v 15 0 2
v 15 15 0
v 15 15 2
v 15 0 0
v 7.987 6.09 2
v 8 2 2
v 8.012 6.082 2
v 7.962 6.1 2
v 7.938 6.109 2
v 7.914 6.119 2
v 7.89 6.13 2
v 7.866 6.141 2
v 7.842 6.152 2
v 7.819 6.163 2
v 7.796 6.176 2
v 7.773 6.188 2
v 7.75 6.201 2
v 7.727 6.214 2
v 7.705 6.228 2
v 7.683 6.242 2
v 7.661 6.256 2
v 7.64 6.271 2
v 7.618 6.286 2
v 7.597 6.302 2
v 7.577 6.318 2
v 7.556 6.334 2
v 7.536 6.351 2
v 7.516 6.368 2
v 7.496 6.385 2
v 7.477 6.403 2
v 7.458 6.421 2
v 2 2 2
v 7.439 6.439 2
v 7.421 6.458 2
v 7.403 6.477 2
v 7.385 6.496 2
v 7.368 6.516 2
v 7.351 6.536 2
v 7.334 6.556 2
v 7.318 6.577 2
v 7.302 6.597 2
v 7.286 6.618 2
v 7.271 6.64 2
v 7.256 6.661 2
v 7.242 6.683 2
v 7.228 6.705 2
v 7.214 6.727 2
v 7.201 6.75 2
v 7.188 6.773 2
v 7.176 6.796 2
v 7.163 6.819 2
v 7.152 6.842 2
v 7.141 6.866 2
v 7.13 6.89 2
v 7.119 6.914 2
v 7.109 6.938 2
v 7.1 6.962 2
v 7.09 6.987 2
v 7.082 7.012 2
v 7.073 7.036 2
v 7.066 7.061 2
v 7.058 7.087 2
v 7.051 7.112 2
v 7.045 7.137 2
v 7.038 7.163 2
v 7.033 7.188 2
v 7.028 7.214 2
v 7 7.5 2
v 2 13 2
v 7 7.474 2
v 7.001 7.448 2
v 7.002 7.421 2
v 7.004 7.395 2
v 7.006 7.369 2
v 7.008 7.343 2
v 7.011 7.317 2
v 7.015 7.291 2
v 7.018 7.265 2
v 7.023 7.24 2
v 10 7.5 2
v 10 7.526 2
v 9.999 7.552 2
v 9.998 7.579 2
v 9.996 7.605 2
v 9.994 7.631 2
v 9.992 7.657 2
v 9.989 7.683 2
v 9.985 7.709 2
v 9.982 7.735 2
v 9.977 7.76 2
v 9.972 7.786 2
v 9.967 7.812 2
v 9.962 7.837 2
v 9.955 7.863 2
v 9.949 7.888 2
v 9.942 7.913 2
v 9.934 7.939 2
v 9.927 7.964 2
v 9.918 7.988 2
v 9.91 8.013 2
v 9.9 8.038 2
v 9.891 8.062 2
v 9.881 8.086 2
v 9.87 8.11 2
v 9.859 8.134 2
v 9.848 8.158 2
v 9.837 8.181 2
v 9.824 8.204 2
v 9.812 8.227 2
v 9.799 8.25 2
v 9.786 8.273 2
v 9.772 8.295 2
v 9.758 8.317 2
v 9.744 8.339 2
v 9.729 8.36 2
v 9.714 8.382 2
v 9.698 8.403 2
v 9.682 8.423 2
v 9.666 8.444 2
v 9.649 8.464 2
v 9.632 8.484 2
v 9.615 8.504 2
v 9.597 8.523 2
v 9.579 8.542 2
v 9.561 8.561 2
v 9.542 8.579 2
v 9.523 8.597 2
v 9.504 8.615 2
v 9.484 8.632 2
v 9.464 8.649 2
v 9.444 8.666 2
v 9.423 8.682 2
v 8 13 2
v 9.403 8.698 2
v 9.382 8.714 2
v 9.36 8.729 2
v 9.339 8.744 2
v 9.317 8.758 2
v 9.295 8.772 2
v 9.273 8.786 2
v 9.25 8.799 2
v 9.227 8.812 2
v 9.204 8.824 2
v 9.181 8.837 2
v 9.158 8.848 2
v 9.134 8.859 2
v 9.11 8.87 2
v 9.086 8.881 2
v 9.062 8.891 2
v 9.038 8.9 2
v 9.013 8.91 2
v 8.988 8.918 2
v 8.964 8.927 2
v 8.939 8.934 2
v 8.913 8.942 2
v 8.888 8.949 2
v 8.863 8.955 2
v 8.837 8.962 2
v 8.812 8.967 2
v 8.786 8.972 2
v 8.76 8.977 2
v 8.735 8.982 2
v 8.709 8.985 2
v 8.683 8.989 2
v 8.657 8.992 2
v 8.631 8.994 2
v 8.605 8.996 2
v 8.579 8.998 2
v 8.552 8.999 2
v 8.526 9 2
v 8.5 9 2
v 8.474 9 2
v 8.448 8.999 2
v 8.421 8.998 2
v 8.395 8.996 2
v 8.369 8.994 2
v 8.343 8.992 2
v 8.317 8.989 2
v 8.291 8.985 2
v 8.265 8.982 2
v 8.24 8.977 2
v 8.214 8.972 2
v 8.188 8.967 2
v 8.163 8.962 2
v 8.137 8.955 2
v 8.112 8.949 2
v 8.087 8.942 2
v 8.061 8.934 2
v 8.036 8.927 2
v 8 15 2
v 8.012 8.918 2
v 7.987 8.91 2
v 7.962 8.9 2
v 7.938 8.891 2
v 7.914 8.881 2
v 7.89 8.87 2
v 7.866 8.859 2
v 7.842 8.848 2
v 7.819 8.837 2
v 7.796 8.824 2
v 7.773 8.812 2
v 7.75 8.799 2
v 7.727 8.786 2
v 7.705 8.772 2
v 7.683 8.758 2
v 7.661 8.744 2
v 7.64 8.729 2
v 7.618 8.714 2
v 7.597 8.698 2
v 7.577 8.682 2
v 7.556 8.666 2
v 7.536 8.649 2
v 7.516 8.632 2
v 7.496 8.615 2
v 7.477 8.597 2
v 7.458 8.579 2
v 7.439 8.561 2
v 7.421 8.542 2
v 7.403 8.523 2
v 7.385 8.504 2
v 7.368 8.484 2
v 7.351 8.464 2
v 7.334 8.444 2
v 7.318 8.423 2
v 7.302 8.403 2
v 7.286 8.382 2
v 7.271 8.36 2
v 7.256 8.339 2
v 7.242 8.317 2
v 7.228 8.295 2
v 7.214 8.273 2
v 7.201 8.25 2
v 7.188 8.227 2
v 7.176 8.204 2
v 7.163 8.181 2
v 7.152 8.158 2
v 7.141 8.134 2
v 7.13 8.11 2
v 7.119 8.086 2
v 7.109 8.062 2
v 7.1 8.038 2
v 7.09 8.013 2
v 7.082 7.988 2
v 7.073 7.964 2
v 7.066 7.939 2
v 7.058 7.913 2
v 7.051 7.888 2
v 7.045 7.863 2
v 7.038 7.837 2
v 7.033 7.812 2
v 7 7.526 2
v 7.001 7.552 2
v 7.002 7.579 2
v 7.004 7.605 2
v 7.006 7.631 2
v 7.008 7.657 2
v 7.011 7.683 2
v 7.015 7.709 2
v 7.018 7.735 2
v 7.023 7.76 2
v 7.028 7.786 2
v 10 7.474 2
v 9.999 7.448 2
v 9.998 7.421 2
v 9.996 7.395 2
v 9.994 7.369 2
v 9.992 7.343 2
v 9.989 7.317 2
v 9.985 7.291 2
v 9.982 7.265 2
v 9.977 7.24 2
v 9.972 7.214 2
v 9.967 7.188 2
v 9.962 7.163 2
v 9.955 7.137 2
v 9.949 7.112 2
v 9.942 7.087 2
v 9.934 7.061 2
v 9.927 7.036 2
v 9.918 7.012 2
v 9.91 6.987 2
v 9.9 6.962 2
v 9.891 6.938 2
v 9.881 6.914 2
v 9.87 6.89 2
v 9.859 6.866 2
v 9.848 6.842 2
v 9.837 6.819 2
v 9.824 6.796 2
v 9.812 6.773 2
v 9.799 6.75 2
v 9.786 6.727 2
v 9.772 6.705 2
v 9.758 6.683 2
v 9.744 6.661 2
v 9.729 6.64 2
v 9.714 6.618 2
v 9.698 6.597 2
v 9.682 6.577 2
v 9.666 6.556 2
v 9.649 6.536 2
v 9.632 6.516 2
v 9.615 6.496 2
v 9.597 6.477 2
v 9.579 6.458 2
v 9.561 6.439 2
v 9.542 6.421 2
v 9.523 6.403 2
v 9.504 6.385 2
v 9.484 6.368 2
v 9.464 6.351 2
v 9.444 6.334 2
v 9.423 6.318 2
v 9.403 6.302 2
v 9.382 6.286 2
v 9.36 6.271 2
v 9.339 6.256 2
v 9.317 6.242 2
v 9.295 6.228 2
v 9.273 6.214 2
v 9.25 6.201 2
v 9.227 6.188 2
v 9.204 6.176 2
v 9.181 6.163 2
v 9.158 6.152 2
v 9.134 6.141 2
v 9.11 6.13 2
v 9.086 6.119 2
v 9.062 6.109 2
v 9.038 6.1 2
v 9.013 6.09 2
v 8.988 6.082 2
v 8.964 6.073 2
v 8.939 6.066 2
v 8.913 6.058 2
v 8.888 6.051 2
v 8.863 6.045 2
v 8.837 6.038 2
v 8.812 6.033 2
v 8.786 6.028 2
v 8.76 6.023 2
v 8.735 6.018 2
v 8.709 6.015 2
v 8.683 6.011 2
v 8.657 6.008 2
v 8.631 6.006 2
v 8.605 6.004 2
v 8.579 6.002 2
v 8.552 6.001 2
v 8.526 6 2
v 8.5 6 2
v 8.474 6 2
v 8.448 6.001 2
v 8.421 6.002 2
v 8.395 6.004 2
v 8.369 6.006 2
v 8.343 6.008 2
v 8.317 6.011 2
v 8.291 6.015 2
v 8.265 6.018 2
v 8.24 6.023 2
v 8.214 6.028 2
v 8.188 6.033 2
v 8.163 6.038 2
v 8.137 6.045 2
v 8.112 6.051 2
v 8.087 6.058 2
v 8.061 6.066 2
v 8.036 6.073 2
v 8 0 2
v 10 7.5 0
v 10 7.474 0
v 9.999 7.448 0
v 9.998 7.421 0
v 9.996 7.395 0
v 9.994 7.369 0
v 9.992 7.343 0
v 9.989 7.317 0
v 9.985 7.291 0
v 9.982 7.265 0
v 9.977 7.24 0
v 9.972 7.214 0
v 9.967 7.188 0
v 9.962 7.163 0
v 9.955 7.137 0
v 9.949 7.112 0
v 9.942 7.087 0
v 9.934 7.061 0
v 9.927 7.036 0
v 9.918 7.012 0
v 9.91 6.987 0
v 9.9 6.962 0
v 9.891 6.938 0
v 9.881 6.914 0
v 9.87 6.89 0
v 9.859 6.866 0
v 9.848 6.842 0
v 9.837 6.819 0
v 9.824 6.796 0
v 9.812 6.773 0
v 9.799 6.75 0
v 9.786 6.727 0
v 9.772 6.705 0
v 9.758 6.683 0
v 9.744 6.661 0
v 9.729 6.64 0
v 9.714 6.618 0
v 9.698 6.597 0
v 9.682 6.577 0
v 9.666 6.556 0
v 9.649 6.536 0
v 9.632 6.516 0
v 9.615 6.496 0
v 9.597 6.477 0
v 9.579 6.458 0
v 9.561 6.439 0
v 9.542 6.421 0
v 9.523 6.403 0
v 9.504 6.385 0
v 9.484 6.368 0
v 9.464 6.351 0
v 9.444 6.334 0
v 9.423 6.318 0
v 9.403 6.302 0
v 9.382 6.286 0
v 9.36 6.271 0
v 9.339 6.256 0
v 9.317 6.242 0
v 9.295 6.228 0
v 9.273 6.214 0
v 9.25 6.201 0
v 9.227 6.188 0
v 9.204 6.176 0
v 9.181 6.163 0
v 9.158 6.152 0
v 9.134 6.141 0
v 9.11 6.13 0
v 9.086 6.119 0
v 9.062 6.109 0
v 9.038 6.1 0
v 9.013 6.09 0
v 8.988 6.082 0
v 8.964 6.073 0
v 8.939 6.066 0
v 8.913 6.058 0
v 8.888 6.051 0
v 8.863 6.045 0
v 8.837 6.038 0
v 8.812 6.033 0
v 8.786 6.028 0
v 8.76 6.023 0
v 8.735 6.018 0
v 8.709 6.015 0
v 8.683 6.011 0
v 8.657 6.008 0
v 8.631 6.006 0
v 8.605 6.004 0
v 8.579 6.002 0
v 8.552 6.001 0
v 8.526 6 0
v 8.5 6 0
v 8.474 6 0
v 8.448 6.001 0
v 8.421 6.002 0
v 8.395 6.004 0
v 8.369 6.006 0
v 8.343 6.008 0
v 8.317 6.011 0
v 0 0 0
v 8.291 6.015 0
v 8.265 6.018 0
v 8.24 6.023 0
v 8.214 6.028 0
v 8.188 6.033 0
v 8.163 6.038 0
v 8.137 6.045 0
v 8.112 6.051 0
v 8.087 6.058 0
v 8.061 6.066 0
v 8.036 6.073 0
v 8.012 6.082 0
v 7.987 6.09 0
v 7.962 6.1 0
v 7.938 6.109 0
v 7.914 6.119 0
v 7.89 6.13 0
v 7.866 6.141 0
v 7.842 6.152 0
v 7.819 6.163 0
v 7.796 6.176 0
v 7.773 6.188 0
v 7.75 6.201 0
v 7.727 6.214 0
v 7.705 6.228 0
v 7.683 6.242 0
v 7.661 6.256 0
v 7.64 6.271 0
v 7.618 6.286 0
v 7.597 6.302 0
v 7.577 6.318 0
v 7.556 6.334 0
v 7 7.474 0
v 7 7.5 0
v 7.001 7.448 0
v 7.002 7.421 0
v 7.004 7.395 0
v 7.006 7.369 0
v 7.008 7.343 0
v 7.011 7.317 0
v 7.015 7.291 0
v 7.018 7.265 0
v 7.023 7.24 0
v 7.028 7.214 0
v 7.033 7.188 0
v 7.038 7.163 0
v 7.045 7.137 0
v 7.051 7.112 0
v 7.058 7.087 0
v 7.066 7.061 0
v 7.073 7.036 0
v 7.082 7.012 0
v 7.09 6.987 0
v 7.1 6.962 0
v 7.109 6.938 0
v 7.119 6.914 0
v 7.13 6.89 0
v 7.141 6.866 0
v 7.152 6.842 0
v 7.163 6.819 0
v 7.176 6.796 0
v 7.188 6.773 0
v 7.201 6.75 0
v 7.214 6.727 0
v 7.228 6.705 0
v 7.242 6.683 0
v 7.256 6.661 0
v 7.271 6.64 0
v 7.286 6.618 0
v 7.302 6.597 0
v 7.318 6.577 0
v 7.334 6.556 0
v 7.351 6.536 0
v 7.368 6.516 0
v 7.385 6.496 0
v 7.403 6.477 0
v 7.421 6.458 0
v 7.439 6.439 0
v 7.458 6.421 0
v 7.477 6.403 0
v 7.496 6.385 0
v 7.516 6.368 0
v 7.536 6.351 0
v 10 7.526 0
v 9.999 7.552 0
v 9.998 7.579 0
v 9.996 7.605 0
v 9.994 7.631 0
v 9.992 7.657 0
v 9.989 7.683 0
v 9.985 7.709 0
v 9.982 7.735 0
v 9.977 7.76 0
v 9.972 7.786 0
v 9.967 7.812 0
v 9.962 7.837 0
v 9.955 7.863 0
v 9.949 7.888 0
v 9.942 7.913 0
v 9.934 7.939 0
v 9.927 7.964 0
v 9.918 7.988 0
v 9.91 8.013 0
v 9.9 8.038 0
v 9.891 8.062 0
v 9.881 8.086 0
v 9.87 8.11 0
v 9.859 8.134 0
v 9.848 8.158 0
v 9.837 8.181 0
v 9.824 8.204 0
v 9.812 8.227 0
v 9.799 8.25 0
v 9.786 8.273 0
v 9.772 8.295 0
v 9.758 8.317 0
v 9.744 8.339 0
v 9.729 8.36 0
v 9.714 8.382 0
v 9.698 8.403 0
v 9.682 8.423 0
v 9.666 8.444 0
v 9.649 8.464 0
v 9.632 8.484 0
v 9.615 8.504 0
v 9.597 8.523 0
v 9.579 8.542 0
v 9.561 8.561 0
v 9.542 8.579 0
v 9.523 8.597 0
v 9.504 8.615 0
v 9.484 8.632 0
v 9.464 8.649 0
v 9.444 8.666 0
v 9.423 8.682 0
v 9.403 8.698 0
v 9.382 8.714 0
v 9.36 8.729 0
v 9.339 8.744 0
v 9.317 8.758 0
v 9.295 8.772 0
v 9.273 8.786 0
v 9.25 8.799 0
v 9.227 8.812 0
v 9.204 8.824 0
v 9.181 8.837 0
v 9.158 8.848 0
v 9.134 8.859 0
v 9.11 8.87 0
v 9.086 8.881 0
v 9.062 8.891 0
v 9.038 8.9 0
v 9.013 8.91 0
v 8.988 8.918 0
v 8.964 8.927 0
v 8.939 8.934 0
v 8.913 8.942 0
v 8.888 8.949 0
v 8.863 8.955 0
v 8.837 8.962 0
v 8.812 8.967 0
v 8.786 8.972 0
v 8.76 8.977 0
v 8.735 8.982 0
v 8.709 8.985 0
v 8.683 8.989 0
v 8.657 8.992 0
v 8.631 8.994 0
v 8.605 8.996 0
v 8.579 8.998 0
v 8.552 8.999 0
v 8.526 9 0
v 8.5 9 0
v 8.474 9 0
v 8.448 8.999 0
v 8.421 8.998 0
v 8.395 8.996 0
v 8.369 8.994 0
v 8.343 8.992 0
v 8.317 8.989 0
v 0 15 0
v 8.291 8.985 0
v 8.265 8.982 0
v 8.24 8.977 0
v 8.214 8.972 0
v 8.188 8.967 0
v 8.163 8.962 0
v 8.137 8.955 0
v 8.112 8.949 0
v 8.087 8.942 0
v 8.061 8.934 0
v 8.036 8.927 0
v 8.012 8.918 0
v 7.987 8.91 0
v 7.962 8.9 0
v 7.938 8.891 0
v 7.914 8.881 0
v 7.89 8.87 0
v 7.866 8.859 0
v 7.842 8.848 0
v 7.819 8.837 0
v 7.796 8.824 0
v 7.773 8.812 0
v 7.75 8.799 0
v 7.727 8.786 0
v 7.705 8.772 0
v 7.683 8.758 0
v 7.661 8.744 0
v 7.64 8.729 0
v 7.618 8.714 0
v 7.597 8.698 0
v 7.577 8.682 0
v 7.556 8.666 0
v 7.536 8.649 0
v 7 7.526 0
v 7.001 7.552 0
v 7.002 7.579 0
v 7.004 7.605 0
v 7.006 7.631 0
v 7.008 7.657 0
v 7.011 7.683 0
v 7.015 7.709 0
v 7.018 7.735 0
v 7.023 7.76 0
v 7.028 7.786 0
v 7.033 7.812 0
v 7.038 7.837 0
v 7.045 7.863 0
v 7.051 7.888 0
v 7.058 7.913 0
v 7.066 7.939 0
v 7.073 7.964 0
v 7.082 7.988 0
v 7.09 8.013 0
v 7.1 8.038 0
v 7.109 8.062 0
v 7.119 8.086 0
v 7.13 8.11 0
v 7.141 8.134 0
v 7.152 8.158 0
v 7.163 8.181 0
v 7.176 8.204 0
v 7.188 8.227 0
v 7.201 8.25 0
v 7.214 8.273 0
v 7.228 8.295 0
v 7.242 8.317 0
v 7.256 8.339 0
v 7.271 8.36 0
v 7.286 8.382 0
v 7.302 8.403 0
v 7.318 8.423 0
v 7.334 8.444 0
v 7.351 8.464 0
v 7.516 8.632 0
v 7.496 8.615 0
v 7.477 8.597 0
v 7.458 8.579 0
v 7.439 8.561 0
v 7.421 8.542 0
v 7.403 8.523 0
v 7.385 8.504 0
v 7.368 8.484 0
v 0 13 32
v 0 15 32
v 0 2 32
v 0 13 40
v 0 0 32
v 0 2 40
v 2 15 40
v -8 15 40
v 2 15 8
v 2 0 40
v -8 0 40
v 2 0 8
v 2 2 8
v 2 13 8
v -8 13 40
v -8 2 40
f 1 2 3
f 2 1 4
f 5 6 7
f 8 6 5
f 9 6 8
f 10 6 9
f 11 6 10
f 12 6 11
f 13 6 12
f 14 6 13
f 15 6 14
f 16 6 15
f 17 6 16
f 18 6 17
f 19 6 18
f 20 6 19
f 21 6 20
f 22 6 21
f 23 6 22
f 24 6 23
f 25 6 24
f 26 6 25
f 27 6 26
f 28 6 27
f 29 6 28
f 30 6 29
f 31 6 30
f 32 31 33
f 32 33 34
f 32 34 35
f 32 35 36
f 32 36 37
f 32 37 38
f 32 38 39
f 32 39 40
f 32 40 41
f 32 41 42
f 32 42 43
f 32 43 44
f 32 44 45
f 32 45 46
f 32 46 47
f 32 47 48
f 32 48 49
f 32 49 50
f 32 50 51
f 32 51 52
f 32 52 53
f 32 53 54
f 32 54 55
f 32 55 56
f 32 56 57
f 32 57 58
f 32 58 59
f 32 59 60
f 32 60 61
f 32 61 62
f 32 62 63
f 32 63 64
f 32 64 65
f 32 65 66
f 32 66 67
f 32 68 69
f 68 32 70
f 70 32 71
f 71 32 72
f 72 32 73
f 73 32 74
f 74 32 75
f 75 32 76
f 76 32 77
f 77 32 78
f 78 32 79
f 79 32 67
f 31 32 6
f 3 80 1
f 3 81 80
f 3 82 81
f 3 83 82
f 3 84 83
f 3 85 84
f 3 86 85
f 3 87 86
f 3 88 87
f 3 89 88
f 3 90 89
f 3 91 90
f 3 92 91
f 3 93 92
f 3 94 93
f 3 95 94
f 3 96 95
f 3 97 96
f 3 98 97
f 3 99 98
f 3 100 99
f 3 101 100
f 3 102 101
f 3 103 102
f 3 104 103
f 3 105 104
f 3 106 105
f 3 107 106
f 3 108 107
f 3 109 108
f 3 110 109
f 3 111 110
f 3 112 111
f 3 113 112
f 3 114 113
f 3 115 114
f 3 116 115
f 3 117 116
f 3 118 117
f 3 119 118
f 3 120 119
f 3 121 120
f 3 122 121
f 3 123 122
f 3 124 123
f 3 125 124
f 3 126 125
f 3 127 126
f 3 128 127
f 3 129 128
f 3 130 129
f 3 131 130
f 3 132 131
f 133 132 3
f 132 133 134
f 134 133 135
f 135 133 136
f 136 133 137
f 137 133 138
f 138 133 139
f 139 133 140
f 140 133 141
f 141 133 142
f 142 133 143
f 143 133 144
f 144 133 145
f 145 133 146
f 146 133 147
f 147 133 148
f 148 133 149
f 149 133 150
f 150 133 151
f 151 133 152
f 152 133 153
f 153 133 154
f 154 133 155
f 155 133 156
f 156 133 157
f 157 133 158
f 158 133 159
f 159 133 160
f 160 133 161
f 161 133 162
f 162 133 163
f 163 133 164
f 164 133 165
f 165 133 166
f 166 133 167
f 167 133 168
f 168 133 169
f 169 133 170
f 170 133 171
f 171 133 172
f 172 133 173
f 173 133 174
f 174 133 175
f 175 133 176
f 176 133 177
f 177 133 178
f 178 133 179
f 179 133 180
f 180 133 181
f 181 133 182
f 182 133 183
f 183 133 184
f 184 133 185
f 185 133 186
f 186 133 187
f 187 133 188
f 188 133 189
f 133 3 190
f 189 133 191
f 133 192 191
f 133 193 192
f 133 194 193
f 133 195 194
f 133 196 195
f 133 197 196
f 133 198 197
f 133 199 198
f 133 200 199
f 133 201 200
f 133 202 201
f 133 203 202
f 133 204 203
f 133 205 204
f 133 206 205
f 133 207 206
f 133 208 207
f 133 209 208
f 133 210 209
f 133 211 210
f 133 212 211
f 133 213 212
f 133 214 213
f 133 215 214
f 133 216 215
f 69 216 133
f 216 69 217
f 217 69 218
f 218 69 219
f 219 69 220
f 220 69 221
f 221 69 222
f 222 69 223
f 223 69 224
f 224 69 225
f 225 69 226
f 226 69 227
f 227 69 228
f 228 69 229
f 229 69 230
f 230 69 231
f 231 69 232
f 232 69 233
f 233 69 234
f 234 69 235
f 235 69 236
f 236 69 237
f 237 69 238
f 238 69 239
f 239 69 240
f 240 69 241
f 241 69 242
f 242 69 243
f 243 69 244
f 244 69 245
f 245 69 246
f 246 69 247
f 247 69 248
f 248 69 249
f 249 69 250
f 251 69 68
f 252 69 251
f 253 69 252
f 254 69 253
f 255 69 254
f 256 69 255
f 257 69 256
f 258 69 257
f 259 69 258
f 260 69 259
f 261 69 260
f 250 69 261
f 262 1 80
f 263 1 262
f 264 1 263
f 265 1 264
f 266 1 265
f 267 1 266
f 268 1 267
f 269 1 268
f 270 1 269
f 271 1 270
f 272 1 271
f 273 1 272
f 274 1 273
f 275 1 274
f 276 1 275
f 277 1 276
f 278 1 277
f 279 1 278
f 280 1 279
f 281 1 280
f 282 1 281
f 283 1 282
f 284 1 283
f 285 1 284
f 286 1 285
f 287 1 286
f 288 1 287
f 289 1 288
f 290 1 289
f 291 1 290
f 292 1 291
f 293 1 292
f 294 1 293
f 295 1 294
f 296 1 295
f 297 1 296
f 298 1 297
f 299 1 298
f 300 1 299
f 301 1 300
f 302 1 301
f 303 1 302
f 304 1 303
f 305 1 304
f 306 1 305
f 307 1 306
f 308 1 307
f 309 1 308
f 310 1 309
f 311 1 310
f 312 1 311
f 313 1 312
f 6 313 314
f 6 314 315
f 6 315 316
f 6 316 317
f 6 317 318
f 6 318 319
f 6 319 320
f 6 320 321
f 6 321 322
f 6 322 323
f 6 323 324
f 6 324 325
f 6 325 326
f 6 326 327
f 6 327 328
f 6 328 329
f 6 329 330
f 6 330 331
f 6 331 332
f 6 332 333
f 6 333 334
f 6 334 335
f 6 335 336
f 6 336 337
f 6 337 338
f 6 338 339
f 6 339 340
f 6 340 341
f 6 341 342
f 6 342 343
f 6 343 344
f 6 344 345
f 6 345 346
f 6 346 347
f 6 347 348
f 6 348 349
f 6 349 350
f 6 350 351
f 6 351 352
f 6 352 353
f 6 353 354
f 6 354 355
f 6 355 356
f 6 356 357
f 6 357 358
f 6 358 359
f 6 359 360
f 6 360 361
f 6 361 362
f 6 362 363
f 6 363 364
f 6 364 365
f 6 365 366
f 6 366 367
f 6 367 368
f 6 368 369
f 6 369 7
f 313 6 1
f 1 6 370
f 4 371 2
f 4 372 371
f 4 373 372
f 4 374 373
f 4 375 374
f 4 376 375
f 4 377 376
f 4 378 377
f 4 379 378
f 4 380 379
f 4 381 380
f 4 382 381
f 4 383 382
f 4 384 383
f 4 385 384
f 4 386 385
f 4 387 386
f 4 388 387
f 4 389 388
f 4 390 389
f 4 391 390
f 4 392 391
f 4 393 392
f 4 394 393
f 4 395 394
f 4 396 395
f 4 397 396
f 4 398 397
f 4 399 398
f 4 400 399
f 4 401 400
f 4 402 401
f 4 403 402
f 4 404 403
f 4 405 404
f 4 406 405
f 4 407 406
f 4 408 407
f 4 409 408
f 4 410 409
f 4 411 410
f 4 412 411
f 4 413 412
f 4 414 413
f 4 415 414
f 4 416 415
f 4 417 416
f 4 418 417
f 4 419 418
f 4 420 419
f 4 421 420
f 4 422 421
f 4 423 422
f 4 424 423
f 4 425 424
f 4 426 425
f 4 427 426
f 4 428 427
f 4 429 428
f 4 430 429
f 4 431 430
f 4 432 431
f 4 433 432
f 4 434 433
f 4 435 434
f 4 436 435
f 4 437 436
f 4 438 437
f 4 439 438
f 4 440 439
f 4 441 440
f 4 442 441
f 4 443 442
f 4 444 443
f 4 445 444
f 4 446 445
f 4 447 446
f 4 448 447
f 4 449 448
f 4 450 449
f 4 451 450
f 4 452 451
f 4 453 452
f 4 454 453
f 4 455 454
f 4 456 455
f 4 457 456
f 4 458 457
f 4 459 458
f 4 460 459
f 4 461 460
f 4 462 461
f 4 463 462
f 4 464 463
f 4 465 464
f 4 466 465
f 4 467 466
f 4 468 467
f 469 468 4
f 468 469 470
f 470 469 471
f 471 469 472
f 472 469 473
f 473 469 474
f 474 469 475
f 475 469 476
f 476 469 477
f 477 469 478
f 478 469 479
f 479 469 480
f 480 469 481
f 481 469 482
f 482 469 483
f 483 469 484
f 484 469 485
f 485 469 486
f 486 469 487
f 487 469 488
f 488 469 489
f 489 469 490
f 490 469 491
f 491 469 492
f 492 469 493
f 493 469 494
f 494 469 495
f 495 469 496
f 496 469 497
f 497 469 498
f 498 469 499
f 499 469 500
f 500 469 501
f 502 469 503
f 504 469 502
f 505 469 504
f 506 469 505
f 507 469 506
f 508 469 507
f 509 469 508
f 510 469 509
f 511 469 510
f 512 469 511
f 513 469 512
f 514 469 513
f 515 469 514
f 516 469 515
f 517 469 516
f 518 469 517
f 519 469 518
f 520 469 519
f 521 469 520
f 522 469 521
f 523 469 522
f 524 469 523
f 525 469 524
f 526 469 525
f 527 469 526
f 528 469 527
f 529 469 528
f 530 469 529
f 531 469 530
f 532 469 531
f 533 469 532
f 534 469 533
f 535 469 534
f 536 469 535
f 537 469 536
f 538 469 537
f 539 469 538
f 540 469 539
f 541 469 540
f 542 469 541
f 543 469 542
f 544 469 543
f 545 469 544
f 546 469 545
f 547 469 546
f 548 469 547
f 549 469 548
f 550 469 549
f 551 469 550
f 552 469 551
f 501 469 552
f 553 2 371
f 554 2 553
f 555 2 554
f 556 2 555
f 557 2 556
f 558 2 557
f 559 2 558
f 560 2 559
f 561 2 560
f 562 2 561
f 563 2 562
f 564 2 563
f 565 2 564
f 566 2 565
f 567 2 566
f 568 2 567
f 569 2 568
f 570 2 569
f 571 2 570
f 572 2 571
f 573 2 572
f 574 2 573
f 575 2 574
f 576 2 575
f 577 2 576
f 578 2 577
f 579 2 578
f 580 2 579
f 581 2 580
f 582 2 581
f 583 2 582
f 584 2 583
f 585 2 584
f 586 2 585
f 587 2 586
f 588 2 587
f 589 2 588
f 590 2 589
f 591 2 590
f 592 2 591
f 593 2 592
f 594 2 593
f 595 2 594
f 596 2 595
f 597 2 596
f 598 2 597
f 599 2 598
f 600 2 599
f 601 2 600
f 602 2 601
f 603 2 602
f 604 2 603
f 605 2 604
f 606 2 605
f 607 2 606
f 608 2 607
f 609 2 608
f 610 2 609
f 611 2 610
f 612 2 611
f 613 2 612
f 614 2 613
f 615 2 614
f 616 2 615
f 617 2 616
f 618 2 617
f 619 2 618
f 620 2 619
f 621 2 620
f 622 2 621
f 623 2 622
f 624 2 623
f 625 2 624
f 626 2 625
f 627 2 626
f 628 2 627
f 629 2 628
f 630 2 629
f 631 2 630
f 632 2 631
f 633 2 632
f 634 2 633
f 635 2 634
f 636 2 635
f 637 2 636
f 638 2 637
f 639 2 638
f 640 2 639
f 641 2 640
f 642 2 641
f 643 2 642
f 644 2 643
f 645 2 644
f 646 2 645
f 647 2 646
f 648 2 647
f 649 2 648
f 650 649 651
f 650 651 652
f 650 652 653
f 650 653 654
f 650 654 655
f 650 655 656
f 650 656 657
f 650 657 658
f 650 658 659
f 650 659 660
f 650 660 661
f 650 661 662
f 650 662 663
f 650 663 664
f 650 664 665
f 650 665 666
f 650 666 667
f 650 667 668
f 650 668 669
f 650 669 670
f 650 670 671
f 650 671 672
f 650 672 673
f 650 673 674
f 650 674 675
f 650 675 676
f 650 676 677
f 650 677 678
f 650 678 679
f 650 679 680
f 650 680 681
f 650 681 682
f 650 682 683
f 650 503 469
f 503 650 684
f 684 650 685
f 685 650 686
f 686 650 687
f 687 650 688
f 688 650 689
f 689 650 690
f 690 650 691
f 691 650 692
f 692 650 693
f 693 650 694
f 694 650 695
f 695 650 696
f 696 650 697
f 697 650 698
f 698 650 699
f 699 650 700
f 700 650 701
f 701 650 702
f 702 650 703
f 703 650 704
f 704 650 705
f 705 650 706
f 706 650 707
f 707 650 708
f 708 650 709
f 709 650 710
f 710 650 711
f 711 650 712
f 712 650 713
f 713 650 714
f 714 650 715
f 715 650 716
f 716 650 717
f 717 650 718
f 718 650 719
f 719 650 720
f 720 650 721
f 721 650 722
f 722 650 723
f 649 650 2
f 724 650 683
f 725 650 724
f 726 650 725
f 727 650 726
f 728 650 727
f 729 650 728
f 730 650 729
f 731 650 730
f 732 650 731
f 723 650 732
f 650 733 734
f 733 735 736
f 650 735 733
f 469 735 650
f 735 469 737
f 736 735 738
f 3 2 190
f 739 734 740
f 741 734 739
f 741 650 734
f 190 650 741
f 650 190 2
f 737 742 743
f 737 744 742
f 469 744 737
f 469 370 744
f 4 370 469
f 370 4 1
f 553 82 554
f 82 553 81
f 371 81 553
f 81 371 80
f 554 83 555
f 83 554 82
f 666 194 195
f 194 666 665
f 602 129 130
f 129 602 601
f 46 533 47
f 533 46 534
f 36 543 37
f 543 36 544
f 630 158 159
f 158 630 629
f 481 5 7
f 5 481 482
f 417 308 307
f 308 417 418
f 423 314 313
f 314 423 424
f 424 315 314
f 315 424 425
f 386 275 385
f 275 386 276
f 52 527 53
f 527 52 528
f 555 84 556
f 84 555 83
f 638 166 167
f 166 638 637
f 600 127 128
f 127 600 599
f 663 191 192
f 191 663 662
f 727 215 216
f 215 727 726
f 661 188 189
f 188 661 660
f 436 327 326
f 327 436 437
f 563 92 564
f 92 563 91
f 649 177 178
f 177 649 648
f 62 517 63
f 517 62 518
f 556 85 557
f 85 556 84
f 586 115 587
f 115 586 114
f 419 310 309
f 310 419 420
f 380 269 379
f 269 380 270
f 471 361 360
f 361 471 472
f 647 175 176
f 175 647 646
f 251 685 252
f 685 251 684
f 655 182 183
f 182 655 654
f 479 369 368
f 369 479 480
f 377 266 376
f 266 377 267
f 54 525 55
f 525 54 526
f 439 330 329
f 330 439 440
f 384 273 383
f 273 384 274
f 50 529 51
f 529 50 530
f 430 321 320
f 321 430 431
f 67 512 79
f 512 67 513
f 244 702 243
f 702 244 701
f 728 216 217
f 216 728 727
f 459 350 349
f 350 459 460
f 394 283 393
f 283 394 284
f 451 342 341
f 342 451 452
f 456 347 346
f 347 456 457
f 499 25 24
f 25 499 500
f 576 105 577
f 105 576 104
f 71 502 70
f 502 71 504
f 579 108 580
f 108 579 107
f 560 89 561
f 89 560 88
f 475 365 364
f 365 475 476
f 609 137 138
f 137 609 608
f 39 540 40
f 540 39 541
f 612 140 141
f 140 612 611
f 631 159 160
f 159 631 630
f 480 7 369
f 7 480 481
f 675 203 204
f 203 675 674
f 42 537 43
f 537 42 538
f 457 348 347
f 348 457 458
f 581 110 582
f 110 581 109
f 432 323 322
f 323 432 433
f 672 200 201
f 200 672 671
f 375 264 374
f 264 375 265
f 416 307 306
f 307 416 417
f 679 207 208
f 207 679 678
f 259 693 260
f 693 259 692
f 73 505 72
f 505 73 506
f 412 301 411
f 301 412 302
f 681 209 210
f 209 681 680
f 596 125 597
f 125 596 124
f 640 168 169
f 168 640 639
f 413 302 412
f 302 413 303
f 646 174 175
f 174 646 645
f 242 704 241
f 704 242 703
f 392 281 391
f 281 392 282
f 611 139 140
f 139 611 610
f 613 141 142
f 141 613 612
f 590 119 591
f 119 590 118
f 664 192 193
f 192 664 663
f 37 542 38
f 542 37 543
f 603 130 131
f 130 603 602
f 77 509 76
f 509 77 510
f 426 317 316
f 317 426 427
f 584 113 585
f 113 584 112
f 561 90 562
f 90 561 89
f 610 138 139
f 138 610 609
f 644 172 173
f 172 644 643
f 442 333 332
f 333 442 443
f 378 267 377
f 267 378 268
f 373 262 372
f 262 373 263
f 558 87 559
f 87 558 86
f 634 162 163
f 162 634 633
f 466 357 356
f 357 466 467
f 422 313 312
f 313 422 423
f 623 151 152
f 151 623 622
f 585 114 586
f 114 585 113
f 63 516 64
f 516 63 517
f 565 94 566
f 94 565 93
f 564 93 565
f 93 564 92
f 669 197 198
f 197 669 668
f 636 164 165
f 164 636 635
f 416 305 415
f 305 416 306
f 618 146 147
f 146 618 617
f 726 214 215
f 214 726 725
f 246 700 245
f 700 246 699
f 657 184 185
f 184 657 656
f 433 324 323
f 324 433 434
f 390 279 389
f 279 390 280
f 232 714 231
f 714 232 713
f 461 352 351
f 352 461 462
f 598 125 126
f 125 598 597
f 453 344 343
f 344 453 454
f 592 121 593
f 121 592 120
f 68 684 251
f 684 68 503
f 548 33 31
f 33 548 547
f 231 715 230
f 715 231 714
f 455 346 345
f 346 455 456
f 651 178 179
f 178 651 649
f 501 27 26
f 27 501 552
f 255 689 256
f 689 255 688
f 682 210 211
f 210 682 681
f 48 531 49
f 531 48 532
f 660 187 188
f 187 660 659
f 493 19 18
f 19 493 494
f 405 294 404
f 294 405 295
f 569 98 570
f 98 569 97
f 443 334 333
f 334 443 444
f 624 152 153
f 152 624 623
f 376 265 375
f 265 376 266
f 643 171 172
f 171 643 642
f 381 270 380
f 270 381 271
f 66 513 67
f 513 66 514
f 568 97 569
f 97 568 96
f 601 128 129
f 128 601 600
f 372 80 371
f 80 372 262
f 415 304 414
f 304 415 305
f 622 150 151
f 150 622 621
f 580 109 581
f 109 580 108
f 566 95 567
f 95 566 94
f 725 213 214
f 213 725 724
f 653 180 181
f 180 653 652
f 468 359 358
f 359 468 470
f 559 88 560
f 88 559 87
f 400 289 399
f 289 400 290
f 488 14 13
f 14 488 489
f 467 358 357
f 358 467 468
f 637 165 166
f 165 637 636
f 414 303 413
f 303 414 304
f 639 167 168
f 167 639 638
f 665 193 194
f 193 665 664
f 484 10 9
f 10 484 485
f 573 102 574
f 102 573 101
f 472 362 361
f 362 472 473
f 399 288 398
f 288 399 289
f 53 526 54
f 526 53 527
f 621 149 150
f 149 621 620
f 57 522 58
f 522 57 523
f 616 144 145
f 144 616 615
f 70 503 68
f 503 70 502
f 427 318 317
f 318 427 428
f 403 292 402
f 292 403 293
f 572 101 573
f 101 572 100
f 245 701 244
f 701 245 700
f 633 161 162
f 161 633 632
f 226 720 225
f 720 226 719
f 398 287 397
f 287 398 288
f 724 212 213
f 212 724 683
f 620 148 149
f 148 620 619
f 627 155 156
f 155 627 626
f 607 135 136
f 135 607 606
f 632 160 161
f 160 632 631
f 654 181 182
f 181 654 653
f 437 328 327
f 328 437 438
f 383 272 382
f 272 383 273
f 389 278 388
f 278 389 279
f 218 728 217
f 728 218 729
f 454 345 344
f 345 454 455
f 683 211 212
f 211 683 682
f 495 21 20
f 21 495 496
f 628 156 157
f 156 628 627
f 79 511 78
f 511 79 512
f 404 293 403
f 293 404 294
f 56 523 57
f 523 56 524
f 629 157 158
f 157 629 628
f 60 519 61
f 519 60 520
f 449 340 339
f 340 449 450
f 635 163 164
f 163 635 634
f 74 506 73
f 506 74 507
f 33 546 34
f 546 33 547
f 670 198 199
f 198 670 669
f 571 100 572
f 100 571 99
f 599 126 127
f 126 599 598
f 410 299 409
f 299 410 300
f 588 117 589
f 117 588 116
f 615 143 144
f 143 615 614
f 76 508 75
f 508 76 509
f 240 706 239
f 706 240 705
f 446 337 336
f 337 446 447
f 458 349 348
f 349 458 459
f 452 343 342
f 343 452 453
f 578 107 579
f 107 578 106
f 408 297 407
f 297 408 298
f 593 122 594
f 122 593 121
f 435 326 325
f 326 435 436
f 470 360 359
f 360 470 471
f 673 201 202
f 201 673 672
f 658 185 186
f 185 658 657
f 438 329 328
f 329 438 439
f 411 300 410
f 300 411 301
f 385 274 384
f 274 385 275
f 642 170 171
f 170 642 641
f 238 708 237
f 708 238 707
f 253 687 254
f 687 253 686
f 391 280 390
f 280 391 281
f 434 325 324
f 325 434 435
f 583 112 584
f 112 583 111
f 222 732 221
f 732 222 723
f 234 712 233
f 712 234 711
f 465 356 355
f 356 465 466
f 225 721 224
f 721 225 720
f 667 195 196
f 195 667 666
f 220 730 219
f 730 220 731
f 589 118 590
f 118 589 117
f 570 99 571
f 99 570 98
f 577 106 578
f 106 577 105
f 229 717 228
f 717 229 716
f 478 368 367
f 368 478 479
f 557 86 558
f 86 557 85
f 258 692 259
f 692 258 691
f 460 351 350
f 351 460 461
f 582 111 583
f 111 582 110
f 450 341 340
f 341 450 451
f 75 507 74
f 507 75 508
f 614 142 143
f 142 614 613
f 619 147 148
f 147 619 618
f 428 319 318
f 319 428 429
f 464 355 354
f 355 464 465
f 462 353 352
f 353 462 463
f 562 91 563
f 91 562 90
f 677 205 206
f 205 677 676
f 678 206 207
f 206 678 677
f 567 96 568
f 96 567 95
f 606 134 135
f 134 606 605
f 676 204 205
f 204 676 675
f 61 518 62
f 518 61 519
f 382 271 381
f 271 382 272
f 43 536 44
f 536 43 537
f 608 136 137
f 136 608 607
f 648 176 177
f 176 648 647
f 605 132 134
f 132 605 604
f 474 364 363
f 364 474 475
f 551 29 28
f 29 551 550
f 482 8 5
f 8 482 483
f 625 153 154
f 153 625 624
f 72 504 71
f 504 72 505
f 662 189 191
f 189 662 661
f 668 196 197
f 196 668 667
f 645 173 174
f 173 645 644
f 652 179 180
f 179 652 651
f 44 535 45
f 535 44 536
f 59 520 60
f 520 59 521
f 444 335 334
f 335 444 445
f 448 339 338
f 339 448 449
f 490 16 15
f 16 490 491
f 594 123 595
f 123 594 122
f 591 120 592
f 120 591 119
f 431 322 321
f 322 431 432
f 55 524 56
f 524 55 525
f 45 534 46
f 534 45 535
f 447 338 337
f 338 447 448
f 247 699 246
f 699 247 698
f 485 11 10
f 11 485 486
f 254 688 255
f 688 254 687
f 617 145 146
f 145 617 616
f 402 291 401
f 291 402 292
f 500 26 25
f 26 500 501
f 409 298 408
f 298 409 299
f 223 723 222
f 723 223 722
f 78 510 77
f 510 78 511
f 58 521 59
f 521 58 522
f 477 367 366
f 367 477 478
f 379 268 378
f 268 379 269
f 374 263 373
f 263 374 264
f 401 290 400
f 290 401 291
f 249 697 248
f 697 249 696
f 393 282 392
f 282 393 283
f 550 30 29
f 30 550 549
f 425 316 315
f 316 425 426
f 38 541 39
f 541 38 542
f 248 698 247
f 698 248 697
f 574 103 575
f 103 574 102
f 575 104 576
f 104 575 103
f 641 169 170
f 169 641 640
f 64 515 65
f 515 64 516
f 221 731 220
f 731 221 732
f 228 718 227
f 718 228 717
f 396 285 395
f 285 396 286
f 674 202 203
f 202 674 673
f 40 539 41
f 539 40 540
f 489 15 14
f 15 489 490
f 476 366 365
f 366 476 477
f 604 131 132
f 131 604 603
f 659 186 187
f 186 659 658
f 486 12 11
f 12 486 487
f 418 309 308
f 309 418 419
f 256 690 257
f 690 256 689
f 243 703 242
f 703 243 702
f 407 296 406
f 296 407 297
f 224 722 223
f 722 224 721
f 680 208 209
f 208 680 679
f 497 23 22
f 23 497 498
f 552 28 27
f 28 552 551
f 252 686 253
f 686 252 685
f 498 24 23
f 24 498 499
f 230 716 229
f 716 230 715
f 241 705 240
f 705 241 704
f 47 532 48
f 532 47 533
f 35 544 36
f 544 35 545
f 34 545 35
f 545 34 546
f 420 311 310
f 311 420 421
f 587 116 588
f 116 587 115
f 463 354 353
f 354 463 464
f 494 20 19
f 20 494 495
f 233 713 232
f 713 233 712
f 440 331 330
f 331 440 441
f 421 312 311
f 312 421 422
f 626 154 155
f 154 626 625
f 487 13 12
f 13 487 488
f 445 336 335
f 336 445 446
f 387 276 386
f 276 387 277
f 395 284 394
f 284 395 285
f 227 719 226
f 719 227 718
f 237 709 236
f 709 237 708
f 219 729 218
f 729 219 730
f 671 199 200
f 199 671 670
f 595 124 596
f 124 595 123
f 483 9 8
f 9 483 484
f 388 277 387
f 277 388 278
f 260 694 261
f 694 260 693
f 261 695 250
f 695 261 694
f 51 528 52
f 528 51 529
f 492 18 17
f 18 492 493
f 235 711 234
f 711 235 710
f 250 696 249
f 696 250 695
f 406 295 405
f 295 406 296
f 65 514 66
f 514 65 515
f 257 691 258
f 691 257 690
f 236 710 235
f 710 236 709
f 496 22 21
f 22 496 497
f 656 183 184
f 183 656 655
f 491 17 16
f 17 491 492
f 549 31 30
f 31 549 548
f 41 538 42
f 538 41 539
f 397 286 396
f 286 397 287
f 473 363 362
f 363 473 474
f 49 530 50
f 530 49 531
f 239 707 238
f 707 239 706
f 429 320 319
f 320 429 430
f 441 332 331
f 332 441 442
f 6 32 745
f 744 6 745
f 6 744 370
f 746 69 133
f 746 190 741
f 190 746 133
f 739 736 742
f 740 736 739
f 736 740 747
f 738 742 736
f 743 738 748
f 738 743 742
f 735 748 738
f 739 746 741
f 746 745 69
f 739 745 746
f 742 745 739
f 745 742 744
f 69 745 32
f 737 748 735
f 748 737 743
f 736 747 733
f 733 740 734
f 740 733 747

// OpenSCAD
pillar_strength = 2;
pillar_height = 40;
pillar_width = 20;
hole_radius = 1.5;

module enforcement(size=10, strength=pillar_strength) {
    difference() {
        cube([strength, size,  size]);
        // diagonal cut
        translate([-strength / 2, size,  0]) 
            rotate([45, 0, 0]) 
            cube([strength*2, size*2, size*2]);
    }
}

module z_pillar(width=pillar_width, height=pillar_height, strength=pillar_strength, enforcement_size=10, hole_radius=hole_radius) {
    // Plate
    difference() {
        cube([width, width, strength]); 
        #translate([width/2 + strength/2, width/2, -1])
        cylinder(h=strength+2, r=hole_radius, $fn=360);
        
    }
    // Wall
    cube([strength, width, height]);
    // enforcements
    translate([0, strength, 0]) 
        rotate([0, 0, 270]) 
        enforcement(enforcement_size);
    translate([0, width, 0]) 
        rotate([0, 0, 270]) 
        enforcement(enforcement_size);
    translate([strength, strength, height]) 
        rotate([180, 0, 270]) 
        enforcement(enforcement_size);
    translate([strength, width, height]) 
        rotate([180, 0, 270]) 
        enforcement(enforcement_size);
    
}

z_pillar(15);
